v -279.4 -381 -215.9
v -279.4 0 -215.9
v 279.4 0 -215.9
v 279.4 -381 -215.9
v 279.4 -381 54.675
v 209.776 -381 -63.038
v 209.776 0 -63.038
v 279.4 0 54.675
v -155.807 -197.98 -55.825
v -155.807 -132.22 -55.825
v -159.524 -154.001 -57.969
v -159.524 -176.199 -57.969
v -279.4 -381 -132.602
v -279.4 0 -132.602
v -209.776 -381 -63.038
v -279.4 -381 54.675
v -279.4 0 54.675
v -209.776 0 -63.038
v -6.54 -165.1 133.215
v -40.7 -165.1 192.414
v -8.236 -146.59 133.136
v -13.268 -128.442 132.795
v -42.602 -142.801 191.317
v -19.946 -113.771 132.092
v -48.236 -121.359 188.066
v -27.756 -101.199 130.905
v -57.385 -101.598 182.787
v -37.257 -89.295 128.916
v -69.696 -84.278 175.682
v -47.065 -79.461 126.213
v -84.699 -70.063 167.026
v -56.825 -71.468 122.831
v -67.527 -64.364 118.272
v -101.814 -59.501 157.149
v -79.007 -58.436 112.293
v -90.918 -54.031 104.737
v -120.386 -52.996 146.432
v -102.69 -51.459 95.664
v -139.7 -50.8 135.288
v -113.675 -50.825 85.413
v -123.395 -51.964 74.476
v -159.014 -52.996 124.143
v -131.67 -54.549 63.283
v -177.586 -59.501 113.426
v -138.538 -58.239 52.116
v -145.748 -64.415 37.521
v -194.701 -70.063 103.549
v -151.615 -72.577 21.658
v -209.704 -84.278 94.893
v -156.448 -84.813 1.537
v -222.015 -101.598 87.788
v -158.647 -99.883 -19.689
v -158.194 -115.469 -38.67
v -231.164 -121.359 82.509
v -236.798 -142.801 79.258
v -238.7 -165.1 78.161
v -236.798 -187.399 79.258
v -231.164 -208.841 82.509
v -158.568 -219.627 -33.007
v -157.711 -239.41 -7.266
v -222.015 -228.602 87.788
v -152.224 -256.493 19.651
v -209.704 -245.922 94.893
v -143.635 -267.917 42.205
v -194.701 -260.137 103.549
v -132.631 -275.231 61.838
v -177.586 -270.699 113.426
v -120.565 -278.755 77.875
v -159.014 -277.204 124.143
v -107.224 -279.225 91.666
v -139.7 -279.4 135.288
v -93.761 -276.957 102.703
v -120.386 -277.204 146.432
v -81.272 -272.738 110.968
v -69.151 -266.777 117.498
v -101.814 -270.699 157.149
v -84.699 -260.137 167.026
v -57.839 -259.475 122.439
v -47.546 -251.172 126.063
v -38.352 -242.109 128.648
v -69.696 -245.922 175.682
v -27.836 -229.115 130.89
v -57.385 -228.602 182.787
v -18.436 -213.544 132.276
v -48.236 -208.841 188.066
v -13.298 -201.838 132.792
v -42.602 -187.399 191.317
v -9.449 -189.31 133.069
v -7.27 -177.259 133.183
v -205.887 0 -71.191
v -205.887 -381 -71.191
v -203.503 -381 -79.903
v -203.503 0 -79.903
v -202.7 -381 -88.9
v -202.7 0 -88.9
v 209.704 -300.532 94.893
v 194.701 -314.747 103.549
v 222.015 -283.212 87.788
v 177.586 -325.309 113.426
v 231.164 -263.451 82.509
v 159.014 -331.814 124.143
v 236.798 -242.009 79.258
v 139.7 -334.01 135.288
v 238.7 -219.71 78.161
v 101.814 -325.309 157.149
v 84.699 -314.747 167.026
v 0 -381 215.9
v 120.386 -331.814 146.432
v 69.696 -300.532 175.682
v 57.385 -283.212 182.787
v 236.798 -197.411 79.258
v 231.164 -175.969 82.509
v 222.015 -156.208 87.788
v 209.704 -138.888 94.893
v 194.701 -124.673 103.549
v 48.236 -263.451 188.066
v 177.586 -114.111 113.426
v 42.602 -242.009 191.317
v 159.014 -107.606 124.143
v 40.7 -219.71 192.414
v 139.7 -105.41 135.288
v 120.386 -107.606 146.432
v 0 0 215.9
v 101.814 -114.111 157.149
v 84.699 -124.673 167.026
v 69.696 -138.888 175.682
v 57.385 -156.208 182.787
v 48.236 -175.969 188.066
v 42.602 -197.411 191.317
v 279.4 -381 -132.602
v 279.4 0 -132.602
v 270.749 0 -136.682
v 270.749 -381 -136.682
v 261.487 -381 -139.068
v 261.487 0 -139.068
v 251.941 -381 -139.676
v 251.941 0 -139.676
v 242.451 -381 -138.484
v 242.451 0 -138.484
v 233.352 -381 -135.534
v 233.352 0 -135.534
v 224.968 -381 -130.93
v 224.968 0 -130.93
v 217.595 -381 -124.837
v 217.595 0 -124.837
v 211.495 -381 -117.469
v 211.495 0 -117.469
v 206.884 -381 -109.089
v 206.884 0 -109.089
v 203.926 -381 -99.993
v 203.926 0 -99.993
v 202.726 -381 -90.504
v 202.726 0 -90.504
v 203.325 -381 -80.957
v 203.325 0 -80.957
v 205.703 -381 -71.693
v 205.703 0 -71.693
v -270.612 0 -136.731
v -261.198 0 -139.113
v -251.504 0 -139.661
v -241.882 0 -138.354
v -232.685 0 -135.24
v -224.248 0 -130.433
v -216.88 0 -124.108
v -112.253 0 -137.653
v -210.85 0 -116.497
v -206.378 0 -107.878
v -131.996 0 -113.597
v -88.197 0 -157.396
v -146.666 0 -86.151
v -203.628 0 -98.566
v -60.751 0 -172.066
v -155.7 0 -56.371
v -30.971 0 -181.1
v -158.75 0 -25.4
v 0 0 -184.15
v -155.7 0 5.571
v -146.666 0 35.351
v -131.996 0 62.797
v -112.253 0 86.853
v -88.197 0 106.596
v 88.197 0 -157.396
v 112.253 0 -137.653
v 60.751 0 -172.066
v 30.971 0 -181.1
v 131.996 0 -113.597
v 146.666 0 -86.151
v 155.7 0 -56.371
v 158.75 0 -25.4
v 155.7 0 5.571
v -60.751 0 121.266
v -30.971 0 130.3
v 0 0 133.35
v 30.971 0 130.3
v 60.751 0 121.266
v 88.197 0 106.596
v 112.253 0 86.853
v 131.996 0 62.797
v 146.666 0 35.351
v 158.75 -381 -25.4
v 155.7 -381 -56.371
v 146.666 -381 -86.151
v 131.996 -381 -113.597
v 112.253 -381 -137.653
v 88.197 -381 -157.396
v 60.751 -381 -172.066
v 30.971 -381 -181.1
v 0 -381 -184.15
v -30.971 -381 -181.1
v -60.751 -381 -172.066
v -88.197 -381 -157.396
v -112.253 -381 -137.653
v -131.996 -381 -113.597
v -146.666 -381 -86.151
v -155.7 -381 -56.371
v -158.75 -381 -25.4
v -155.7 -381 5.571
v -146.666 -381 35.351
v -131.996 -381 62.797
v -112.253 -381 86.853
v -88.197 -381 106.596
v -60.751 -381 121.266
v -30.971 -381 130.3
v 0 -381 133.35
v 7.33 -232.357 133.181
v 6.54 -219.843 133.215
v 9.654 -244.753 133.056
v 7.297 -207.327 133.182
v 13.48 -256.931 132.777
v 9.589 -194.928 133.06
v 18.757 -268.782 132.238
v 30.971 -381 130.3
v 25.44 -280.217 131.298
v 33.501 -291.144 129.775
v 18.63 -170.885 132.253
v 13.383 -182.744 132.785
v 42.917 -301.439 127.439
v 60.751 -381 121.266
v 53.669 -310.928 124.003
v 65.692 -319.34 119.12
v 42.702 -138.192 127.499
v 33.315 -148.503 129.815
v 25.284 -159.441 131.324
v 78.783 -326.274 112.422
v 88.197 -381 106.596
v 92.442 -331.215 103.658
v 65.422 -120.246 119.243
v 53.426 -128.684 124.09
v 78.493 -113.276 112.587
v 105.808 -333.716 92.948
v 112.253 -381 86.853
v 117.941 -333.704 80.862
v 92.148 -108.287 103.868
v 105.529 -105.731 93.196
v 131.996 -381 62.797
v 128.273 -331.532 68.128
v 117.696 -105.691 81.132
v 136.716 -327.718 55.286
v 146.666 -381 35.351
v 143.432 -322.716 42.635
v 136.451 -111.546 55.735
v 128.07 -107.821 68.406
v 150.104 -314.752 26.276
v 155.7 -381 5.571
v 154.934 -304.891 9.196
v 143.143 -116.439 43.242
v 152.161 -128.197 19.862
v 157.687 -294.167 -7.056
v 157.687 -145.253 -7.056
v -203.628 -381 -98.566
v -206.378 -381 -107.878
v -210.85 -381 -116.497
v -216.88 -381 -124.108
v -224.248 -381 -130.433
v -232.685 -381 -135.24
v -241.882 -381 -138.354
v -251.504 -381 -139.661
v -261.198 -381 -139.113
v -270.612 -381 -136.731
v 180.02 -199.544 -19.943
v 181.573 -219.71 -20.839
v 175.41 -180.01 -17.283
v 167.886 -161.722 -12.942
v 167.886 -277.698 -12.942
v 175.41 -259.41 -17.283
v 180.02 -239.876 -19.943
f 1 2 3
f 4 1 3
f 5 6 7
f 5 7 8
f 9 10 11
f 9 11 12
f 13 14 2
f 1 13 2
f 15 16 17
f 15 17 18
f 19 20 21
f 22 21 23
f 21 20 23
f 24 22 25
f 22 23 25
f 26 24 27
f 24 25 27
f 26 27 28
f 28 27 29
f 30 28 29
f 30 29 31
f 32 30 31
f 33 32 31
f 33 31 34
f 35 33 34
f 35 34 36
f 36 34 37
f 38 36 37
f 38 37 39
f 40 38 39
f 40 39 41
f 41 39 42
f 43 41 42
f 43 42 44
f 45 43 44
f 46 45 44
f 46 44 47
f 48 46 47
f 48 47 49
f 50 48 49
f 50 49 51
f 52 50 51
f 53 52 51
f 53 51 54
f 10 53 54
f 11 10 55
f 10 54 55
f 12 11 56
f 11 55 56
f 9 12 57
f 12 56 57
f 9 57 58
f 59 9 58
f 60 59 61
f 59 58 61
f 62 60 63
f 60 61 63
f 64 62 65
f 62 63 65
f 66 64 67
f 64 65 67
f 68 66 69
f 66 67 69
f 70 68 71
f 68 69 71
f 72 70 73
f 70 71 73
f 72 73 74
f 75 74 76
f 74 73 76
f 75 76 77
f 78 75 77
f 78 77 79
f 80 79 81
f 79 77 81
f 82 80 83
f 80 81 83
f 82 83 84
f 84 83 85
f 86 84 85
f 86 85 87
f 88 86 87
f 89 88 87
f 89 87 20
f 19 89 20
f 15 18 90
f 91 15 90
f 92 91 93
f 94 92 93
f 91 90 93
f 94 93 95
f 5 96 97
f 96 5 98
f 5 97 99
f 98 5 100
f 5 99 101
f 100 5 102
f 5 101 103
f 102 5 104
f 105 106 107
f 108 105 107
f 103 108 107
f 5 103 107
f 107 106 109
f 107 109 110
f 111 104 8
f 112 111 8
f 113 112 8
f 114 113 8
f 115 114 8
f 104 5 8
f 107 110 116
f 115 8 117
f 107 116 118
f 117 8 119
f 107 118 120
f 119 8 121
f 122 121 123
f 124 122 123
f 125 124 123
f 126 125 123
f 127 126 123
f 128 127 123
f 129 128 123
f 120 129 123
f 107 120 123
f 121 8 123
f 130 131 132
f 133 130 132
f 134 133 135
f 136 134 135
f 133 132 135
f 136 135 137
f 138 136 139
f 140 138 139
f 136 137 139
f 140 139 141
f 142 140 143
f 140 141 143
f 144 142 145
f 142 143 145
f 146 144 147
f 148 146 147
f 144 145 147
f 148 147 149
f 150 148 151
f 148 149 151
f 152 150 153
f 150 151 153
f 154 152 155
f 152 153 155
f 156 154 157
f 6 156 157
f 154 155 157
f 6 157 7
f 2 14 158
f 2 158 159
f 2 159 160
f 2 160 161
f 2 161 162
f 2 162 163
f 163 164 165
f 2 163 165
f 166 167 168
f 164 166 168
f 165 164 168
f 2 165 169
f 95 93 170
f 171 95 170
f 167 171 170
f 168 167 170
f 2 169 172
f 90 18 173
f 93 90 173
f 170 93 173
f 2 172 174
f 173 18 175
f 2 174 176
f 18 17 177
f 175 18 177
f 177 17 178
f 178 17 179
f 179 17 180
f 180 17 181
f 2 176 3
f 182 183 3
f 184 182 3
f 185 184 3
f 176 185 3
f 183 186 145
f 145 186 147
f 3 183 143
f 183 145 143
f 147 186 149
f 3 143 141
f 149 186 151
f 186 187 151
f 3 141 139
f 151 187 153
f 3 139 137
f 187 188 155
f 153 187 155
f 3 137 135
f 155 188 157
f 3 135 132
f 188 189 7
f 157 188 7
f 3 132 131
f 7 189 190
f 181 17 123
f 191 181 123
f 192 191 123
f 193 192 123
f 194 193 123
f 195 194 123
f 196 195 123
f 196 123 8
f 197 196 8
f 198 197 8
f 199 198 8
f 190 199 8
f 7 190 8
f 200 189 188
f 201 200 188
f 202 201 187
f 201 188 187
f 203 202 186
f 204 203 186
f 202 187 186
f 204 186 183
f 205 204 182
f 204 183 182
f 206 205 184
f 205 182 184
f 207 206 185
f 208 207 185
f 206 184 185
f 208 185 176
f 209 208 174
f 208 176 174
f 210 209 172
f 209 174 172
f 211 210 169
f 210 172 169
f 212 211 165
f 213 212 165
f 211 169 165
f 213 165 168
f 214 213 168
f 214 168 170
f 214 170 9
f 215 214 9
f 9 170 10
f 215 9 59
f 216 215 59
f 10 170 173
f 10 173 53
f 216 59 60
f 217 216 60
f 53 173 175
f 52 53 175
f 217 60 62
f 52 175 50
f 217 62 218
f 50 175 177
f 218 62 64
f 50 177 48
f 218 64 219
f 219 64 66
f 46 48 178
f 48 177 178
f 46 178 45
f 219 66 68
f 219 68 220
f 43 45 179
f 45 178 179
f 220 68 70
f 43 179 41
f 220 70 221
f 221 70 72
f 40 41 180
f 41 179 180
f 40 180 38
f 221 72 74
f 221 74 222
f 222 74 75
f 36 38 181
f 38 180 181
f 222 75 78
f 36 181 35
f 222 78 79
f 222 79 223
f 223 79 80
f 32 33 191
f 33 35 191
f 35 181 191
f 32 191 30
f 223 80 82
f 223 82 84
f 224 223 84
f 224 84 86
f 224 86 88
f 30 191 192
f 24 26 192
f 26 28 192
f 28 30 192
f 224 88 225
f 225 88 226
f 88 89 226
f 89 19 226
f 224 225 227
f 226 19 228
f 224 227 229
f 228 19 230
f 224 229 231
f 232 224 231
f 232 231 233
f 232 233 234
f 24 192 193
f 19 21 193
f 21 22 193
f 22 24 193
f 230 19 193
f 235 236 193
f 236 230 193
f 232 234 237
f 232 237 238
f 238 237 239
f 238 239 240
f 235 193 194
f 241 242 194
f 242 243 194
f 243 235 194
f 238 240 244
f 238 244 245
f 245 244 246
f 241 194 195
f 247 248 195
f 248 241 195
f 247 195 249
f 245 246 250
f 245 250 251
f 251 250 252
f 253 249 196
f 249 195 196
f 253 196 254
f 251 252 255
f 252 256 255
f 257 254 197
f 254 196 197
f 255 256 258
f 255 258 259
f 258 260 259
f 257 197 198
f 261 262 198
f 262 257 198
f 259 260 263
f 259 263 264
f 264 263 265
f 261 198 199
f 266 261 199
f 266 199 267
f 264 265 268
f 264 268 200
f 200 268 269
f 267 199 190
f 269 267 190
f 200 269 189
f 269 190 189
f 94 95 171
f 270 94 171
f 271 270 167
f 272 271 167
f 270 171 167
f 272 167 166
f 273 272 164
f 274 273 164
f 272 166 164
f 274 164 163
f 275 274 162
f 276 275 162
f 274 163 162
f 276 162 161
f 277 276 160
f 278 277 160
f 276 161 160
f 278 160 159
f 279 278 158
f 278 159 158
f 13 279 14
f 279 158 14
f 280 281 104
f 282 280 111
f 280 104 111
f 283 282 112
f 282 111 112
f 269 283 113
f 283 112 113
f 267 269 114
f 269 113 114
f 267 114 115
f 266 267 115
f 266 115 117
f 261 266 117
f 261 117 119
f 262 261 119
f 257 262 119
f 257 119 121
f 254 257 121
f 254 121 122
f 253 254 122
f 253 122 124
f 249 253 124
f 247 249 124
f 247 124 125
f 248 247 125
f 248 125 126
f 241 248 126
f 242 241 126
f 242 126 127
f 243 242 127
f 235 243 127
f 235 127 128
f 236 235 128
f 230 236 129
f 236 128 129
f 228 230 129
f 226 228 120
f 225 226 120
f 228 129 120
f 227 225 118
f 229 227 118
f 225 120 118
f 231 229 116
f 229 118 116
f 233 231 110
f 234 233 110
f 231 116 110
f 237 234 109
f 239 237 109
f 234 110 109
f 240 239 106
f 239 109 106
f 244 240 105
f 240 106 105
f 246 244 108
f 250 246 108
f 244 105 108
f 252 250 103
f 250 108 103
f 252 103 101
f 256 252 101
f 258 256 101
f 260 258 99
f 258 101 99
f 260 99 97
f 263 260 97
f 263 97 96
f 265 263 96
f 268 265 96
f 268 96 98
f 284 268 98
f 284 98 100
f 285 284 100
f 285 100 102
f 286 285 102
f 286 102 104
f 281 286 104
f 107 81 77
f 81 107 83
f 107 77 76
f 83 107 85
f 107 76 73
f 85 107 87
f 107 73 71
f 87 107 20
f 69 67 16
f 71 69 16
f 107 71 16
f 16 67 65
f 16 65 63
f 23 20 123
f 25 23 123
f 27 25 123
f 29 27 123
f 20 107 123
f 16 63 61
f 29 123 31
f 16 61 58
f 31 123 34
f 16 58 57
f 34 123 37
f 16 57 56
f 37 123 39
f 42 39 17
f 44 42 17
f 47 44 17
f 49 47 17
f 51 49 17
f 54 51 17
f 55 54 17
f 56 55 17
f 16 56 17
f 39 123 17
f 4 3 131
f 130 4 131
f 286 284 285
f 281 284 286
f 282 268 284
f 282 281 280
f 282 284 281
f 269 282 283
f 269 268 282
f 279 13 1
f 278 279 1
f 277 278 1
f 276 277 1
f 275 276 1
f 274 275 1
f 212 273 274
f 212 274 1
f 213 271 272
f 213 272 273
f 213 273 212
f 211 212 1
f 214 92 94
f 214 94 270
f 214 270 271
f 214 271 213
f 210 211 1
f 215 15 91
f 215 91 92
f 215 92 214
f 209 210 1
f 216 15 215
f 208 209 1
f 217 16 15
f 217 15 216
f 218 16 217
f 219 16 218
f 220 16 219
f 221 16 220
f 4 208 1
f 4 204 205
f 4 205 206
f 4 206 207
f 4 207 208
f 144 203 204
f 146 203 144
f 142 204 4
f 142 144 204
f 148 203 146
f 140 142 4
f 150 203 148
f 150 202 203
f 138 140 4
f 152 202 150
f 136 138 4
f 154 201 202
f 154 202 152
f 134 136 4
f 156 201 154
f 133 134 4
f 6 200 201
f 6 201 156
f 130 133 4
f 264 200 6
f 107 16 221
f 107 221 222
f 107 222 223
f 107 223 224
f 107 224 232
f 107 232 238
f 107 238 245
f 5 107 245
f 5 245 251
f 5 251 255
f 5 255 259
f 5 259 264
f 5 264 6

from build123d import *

# Parameters (mm, degrees)
F1_DEPTH = 381
F2_R     = 114.3
F3_DEPTH = 114.3
F4_R     = 114.3
F5_DEPTH = 157.48


with BuildPart() as f1:
    # F0 (on Front) → F1 (new body)
    with BuildSketch(Plane.XZ):
        with BuildLine():
            Line((-253.5002529621, -215.9), (0, -215.9))
            Line((0, -215.9), (0, -184.15))
            ThreePointArc((0, -184.15), (-158.75, -25.4), (0, 133.35))
            Line((0, 133.35), (0, 215.9))
            Line((0, 215.9), (-279.4, 54.6750131028))
            Line((-279.4, 54.6750131028), (-209.7759521092, -63.0383388986))
            ThreePointArc((-209.7759521092, -63.0383388986), (-204.5010974422, -75.4939283033), (-202.7002529621, -88.9))
            ThreePointArc((-202.7002529621, -88.9), (-217.5792284778, -124.8210244843), (-253.5002529621, -139.7))
            Line((-253.5002529621, -139.7), (-253.5002529621, -215.9))
        make_face()
        with BuildLine():
            Line((-279.4, -215.9), (-253.5002529621, -215.9))
            Line((-253.5002529621, -215.9), (-253.5002529621, -139.7))
            ThreePointArc((-253.5002529621, -139.7), (-266.9276691811, -137.8933107034), (-279.4, -132.6017517197))
            Line((-279.4, -132.6017517197), (-279.4, -215.9))
        make_face()
        with BuildLine():
            Line((0, -215.9), (279.4, -215.9))
            Line((279.4, -215.9), (279.4, -182.111337781))
            Line((279.4, -182.111337781), (279.4, -132.6017517197))
            ThreePointArc((279.4, -132.6017517197), (217.5948803765, -124.8366695659), (209.7759521092, -63.0383388986))
            Line((209.7759521092, -63.0383388986), (279.4, 54.6750131028))
            Line((279.4, 54.6750131028), (0, 215.9))
            Line((0, 215.9), (0, 133.35))
            ThreePointArc((0, 133.35), (112.2532015134, 86.8532015134), (158.75, -25.4))
            ThreePointArc((158.75, -25.4), (112.2532015134, -137.6532015134), (0, -184.15))
            Line((0, -184.15), (0, -215.9))
        make_face()
    extrude(amount=F1_DEPTH)

    # F2 (on face) → F3 (cut)
    with BuildSketch(Plane(origin=(93.4623118289, 0, 161.968503937), x_dir=(0.8661417323, 0, -0.499798459), z_dir=(0.499798459, 0, 0.8661417323))):
        with Locations((53.3835127066, -219.71)):
            Circle(F2_R)
    extrude(amount=-F3_DEPTH, mode=Mode.SUBTRACT)

    # F4 (on face) → F5 (cut)
    with BuildSketch(Plane(origin=(-93.4623118289, 0, 161.968503937), x_dir=(0.8661417323, 0, 0.499798459), z_dir=(-0.499798459, 0, 0.8661417323))):
        with Locations((-53.3835127066, -165.1)):
            Circle(F4_R)
    extrude(amount=-F5_DEPTH, mode=Mode.SUBTRACT)


solid = f1.part
